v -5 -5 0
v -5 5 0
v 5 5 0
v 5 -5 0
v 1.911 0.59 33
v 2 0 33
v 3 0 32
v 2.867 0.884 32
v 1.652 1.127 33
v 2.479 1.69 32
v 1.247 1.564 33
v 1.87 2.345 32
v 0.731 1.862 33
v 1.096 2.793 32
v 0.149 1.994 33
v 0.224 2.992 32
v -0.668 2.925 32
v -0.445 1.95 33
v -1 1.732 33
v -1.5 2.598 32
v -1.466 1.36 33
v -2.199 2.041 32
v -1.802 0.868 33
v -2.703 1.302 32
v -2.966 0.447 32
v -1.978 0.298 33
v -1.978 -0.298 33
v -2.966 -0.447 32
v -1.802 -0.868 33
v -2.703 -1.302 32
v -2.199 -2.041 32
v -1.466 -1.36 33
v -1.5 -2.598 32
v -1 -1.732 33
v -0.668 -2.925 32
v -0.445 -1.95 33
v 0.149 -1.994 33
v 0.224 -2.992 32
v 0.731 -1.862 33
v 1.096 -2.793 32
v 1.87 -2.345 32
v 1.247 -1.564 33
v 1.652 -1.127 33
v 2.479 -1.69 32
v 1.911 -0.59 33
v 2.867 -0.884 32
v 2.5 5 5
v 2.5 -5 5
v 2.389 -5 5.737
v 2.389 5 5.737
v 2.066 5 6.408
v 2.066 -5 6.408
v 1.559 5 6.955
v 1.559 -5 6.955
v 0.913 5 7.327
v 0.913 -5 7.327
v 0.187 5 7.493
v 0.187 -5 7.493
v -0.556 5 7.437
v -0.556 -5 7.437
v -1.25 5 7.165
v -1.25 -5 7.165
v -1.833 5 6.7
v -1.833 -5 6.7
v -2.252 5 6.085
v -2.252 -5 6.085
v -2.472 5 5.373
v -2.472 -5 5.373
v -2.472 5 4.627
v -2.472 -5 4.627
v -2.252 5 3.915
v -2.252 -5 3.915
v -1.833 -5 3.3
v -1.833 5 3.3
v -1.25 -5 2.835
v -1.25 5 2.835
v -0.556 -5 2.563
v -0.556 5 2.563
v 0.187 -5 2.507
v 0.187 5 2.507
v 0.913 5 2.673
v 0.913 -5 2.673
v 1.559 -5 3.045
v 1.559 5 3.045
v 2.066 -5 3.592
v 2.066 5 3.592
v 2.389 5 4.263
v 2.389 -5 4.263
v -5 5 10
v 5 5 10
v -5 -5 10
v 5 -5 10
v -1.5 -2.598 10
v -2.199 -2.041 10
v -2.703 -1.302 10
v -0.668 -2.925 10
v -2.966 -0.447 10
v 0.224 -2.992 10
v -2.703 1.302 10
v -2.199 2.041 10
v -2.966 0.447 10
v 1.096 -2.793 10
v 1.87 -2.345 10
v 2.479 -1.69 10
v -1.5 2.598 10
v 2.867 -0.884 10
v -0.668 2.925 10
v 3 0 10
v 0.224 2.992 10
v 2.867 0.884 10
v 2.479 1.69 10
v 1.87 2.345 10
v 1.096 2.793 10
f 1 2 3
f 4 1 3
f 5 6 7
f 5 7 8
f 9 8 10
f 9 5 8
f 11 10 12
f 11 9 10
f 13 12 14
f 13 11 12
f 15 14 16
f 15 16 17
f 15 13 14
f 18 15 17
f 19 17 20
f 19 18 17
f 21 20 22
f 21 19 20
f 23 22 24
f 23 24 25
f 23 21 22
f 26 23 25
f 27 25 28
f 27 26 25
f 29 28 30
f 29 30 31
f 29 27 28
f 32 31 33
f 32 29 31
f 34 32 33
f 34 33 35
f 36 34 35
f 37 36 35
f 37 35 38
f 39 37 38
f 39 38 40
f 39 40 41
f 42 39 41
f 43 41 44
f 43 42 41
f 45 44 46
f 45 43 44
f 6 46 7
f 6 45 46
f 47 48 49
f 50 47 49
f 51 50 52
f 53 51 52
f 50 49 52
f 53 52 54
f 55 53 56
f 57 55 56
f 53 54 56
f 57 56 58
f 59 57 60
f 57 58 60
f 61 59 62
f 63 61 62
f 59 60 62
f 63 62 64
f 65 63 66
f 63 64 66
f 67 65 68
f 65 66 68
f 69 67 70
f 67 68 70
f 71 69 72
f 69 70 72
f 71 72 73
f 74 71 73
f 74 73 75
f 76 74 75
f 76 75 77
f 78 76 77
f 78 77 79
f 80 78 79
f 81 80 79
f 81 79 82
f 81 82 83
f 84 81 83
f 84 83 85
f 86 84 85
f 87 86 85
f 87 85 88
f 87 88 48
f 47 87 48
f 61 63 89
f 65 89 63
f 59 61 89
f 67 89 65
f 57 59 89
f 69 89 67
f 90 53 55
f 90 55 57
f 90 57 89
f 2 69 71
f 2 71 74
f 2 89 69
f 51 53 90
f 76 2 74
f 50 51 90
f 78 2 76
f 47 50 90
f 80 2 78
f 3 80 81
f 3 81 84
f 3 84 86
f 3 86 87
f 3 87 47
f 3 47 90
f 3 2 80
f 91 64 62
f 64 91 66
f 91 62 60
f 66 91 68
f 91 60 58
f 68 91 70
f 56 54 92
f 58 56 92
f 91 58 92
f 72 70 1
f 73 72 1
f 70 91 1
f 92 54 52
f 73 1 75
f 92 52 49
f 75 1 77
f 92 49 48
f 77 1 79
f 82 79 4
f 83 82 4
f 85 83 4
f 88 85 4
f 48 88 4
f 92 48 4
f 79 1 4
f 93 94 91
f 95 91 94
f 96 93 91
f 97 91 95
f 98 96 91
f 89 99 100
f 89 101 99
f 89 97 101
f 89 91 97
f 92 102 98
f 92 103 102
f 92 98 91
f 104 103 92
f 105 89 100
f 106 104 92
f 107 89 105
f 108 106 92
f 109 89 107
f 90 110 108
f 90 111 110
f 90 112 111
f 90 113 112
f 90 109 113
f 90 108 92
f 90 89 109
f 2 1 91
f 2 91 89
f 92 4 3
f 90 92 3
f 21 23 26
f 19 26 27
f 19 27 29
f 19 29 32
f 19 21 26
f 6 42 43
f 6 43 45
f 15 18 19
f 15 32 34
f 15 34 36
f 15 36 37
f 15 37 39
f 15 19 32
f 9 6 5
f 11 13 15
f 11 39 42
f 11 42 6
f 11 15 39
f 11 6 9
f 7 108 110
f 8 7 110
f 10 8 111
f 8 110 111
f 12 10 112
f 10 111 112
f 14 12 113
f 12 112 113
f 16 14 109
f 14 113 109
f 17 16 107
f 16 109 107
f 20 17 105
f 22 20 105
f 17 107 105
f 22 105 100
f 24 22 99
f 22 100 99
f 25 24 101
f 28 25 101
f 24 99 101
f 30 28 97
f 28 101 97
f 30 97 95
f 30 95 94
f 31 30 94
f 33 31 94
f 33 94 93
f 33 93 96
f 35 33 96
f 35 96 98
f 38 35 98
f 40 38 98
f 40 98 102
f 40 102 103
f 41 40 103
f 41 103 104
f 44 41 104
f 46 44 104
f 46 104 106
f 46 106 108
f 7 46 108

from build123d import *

# Parameters (mm, degrees)
F0_W     = 10
F0_H     = 10
F0_R     = 3
F1_DEPTH = 10
F2_DEPTH = 33
F3_SIZE  = 1
F4_R     = 2.5
F5_DEPTH = 25


with BuildPart() as f1:
    # F0 (on Top) → F1 (new body)
    with BuildSketch(Plane.XY):
        Rectangle(F0_W, F0_H)
        Circle(F0_R, mode=Mode.SUBTRACT)
    extrude(amount=F1_DEPTH)

    # F0 (on Top) → F2 (join)
    with BuildSketch(Plane.XY):
        Circle(F0_R)
    extrude(amount=F2_DEPTH)

    # F3
    f3_edges = [f1.edges().sort_by_distance(p)[0] for p in [
        (-3, 0, 33),
    ]]
    chamfer(f3_edges, length=F3_SIZE)

    # F4 (on face) → F5 (cut)
    with BuildSketch(Plane.XZ.offset(5)):
        with Locations((0, 5)):
            Circle(F4_R)
    extrude(amount=-F5_DEPTH, mode=Mode.SUBTRACT)


solid = f1.part
